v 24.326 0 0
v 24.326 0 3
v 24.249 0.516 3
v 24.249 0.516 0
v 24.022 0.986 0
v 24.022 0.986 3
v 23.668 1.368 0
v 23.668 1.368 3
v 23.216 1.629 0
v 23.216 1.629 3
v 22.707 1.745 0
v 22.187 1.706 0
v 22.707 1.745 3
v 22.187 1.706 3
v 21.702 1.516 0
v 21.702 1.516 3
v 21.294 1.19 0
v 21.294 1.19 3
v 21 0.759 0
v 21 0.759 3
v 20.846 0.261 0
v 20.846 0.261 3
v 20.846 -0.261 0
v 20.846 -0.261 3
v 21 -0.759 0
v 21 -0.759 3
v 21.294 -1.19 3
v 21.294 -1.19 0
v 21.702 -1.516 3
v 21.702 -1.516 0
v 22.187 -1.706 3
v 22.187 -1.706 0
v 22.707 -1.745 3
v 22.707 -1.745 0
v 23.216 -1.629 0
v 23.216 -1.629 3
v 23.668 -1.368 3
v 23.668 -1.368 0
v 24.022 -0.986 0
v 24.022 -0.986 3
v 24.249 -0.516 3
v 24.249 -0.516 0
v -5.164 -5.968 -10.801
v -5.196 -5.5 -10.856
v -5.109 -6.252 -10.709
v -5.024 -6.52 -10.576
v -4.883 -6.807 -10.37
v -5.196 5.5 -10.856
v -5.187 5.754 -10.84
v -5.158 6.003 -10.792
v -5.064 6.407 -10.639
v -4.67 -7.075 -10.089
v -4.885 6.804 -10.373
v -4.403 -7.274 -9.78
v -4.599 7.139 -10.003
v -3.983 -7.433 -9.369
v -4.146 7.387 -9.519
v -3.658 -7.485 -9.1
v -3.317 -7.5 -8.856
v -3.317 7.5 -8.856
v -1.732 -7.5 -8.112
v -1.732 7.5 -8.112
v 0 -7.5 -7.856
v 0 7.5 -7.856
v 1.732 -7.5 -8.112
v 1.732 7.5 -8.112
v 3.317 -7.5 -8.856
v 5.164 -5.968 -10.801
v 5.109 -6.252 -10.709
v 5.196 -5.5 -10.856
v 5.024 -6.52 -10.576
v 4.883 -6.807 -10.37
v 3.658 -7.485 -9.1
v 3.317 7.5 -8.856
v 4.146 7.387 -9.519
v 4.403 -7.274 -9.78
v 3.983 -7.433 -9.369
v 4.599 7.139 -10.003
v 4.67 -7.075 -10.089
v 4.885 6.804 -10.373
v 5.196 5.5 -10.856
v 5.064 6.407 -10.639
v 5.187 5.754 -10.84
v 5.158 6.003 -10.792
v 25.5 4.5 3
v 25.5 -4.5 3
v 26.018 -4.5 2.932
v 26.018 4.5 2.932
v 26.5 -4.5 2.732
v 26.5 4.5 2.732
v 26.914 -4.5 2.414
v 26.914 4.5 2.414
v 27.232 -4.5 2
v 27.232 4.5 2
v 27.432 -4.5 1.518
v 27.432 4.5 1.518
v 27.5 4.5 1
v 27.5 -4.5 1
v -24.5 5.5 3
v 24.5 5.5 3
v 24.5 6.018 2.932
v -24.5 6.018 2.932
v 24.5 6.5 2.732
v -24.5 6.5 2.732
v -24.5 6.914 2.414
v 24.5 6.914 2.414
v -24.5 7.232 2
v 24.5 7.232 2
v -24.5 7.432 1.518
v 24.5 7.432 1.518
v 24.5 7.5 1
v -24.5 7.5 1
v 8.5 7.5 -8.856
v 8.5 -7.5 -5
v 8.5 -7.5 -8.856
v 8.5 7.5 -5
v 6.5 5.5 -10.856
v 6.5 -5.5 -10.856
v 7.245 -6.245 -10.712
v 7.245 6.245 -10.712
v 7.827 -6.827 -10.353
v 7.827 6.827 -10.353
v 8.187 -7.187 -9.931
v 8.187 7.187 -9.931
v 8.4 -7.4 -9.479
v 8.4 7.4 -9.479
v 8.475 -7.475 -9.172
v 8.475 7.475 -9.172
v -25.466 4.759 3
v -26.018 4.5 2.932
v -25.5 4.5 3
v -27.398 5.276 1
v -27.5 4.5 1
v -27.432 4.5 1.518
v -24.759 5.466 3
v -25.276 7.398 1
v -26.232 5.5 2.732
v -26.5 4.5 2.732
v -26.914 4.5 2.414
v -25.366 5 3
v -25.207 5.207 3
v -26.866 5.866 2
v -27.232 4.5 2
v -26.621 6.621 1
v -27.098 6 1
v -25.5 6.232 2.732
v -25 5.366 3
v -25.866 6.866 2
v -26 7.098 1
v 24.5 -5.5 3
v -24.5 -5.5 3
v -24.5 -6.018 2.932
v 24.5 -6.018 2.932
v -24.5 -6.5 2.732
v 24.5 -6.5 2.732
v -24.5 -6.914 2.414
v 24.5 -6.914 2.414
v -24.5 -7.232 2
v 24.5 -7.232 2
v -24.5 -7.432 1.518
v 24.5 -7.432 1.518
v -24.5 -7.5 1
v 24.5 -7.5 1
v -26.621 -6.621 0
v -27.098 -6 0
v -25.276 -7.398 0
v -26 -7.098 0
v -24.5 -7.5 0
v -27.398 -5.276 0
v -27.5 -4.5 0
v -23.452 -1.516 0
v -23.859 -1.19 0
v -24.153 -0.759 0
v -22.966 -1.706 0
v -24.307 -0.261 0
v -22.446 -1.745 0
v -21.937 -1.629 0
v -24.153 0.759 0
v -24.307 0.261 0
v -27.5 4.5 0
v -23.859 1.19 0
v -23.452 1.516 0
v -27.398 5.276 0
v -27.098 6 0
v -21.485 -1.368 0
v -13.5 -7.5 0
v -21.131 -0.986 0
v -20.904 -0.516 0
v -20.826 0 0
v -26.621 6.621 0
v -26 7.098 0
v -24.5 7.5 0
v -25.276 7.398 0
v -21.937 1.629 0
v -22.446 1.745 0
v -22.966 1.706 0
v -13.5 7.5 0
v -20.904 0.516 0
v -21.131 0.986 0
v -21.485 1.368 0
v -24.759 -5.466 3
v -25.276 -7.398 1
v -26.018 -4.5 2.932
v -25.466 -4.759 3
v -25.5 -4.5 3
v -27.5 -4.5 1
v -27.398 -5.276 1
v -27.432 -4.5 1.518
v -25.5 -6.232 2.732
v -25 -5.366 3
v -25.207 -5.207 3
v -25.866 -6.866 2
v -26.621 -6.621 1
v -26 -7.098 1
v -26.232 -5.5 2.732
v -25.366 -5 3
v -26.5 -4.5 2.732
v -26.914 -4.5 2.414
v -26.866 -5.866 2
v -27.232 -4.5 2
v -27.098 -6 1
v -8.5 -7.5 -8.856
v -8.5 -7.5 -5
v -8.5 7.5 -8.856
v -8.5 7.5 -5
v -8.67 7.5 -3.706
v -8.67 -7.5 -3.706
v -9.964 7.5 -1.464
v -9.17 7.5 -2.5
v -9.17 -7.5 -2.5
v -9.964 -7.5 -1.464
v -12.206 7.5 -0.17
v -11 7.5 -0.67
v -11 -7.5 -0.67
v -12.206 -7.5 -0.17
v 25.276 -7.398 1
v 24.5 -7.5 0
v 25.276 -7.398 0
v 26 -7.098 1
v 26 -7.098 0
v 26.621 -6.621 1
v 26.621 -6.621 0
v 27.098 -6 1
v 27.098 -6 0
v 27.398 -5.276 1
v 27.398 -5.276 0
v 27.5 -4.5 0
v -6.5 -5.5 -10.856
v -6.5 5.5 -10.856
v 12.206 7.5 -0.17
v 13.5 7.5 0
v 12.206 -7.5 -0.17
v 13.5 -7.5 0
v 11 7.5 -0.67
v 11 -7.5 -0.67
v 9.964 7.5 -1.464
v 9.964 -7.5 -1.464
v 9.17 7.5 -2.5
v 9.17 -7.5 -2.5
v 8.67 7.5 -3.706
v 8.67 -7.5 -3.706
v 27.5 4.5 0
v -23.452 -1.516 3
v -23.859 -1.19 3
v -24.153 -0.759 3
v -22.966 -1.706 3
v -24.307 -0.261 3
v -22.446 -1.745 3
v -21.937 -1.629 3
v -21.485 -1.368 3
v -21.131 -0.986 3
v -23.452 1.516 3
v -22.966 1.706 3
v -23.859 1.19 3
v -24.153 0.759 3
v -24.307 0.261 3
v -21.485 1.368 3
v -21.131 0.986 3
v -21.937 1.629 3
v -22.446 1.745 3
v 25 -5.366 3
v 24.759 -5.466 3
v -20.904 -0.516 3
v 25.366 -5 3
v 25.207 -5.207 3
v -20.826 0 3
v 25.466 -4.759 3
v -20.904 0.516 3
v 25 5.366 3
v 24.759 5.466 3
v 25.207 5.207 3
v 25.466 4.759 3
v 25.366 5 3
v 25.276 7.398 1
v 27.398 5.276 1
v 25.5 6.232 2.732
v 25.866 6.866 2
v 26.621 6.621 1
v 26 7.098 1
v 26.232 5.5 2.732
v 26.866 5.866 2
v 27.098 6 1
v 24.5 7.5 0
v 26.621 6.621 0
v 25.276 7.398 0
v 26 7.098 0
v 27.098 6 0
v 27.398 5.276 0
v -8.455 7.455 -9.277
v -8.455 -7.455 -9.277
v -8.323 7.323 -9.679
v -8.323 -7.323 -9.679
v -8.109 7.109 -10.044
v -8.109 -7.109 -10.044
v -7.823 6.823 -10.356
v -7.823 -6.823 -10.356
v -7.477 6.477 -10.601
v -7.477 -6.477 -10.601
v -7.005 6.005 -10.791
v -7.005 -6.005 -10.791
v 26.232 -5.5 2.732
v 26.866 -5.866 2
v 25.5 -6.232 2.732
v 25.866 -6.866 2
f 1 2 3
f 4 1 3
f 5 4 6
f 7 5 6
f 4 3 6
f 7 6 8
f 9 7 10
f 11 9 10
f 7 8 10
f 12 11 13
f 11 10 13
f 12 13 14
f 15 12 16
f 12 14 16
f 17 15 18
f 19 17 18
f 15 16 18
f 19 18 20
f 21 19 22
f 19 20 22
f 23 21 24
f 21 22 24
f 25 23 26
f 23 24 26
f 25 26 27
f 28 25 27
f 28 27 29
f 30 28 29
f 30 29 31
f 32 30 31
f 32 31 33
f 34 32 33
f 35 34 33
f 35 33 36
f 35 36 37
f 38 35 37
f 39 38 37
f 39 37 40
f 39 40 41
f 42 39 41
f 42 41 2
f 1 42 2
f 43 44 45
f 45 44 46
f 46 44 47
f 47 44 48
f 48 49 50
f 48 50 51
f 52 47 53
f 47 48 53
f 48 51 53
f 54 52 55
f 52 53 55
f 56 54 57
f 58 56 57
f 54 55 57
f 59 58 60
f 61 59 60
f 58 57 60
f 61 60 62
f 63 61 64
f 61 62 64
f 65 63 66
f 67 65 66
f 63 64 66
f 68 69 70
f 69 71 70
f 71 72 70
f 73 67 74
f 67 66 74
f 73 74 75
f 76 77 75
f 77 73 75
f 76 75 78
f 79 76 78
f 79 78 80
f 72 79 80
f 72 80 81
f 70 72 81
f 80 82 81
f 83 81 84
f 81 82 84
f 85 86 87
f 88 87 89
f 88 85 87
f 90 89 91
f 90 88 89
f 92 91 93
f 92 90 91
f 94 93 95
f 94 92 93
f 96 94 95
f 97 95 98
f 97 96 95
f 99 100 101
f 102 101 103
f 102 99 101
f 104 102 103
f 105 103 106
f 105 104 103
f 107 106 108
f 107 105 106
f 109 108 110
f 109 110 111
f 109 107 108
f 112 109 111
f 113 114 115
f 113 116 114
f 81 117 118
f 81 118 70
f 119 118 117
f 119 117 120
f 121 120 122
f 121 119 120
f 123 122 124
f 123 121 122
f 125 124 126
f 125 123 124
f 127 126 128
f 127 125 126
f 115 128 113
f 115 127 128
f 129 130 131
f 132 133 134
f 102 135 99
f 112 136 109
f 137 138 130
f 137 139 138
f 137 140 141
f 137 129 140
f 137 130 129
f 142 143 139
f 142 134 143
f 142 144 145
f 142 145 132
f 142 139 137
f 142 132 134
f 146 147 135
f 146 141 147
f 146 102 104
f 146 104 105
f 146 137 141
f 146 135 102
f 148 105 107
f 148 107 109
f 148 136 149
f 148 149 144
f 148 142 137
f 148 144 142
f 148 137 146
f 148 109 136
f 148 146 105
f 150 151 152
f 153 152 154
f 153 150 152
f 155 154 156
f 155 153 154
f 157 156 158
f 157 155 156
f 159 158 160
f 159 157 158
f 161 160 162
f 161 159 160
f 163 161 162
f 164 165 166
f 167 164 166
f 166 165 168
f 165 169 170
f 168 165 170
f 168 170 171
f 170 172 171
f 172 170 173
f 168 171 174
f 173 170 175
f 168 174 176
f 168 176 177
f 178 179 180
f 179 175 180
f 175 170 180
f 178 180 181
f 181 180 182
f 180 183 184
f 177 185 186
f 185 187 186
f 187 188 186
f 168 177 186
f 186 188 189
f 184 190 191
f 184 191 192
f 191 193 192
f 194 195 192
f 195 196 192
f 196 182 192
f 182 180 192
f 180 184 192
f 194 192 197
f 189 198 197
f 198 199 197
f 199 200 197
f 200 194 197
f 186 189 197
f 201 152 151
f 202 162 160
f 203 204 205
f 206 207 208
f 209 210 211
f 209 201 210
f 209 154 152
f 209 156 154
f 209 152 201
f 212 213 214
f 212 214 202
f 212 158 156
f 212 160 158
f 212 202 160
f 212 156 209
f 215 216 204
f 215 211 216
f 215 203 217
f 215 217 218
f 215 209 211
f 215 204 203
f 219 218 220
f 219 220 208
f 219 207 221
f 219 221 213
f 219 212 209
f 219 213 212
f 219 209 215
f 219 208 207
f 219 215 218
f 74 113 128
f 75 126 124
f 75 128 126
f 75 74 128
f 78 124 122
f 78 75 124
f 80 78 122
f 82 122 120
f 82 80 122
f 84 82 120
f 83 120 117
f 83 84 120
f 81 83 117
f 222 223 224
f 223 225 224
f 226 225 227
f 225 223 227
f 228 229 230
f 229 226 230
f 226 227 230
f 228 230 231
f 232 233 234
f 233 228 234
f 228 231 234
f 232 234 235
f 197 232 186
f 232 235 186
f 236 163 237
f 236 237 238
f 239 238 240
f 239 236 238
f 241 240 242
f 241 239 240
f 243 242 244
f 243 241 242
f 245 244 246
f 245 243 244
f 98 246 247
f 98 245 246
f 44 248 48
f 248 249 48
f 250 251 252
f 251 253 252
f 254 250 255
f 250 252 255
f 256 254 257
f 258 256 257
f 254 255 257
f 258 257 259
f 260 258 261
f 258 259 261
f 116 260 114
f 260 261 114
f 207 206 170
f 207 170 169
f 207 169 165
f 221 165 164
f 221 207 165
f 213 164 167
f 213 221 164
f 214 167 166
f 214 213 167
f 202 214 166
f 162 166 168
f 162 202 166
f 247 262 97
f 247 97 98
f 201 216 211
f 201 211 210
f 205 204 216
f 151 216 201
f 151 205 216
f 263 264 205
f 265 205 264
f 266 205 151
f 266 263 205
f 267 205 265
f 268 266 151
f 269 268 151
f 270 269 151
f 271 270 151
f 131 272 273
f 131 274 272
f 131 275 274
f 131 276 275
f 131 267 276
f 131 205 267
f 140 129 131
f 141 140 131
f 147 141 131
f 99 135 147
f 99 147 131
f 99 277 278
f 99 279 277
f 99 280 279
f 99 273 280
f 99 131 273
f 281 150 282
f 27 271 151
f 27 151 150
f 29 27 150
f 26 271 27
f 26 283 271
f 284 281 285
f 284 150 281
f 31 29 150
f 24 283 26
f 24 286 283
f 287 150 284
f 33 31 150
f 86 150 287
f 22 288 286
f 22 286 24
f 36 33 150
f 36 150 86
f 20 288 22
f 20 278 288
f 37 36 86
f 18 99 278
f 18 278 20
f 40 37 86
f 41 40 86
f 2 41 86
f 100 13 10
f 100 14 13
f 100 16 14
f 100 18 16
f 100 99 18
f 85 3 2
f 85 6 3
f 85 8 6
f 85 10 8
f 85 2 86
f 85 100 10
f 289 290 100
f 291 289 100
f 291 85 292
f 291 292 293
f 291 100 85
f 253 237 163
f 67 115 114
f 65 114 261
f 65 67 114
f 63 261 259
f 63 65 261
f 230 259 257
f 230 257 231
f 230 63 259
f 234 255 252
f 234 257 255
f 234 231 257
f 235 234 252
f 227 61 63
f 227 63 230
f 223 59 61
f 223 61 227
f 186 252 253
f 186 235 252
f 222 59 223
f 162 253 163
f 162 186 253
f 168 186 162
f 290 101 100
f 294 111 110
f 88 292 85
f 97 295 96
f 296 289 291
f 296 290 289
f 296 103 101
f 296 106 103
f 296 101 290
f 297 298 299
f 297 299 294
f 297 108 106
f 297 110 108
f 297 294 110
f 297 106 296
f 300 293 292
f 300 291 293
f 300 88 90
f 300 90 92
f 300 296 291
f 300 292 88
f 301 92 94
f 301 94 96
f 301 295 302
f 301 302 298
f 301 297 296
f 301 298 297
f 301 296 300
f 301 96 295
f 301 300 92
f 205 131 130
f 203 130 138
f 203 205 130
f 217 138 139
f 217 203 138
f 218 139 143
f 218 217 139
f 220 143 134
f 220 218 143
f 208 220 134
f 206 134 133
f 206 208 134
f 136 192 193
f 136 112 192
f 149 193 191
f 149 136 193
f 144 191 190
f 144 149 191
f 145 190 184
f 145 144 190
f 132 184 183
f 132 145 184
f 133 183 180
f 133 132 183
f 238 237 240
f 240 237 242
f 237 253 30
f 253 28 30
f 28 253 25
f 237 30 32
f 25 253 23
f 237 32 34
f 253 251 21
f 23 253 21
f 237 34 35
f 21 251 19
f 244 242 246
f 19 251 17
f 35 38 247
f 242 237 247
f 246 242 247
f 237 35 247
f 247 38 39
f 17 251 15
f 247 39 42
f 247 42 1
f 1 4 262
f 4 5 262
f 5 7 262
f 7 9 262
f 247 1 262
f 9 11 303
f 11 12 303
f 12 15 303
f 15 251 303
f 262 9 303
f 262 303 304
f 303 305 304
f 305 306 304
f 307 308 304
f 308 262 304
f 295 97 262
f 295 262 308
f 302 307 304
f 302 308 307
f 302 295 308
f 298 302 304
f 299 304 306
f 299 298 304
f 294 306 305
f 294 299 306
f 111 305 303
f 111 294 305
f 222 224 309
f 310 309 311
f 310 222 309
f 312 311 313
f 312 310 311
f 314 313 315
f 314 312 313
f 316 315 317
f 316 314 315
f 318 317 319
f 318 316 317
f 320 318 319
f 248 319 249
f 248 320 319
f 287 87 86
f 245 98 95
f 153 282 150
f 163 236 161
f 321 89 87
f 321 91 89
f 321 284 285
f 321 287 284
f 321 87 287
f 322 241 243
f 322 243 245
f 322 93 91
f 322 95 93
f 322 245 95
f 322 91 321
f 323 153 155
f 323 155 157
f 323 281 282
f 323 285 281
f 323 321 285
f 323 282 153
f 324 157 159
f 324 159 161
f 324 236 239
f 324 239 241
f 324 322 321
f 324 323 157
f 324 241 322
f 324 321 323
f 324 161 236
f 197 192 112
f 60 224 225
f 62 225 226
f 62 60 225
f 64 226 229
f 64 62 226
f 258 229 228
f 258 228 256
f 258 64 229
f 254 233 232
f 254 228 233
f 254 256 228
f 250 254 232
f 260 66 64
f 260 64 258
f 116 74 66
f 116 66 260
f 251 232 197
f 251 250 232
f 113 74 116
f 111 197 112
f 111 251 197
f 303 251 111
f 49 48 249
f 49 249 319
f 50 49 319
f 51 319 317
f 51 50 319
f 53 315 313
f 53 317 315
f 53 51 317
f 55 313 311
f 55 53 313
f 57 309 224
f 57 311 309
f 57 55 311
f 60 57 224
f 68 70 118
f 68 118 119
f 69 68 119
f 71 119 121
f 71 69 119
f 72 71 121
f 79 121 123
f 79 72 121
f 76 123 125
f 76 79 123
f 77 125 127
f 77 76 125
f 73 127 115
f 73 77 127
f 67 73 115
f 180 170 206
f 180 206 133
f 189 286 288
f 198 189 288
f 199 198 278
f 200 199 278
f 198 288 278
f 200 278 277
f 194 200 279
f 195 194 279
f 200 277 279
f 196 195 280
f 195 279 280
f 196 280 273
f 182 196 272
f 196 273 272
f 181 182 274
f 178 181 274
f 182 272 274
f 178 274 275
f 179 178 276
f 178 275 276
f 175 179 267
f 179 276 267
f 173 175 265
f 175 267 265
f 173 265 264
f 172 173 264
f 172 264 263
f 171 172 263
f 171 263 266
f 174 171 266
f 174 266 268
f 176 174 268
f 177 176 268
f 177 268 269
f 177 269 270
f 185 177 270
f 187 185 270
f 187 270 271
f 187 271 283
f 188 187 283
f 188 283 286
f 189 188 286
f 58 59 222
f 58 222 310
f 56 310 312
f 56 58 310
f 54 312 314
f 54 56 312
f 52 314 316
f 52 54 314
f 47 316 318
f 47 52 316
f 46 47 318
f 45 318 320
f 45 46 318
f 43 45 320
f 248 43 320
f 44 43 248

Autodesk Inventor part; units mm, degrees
ref_plane "YZ Plane" through (0, 0, 0) normal (1, 0, 0) x (0, 1, 0)
ref_plane "XZ Plane" through (0, 0, 0) normal (0, 1, 0) x (-1, 0, 0)
ref_plane "XY Plane" through (0, 0, 0) normal (0, 0, 1) x (1, 0, 0)
sketch "Sketch1" plane through (0, 0, 0) normal (0, 0, 1) x (1, 0, 0)
  point P0 (0, 0)
sketch "Sketch2" plane through (0, 0, 0) normal (0, 0, 1) x (1, 0, 0)
  line L0 (-27.5, 7.5) -> (27.5, 7.5)
  line L1 (27.5, 7.5) -> (27.5, -7.5)
  line L2 (27.5, -7.5) -> (-27.5, -7.5)
  line L3 (-27.5, -7.5) -> (-27.5, 7.5)
  line L4 (-27.5, 7.5) -> (27.5, -7.5) construction
  line L5 (27.5, 7.5) -> (-27.5, -7.5) construction
  point P0 (0, 0)
  dimension "d0" = 15
  dimension "d1" = 55
extrude "Extrusion1" add sketch "Sketch2" along normal blind 3
sketch "Sketch3" plane through (0, 0, 3) normal (0, 0, 1) x (1, 0, 0)
  line L0 (0, 0) -> (22.5765, 0) construction
  circle A0 centre (22.5765, 0) radius 1.75
  line L1 (27.5, 7.5) -> (-27.5, 7.5) construction
  line L2 (0, 7.5) -> (0, -7.5) construction
  line L3 (-27.5, -7.5) -> (27.5, -7.5) construction
  line L4 (0, 0) -> (-22.5765, 0) construction
  circle A1 centre (-22.5765, 0) radius 1.75
  dimension "d4" = 3.5
  dimension "d5" = 45.153
extrude "Extrusion2" cut sketch "Sketch3" against normal through all
sketch "Sketch4" plane through (-27.5, 7.5, 0) normal (0, 1, 0) x (1, 0, 0)
  line L0 (55, 0) -> (0, 0) projected
  line L1 (19, 0) -> (19, 10.8562)
  line L2 (36, 0) -> (36, 10.8562)
  line L3 (27.5, 10.8562) -> (27.5, 0) construction
  line L4 (19, 7.8562) -> (36, 7.8562) construction
  line L5 (19, 0) -> (36, 0) construction
  line L6 (19, 0) -> (36, 0)
  line L7 (19, 10.8562) -> (36, 10.8562) construction
  circle A0 centre (27.5, 13.8562) radius 6
  line L8 (19, 10.8562) -> (22.3038, 10.8562)
  line L9 (36, 10.8562) -> (32.6962, 10.8562)
  dimension "d10" = 10.8562
  dimension "d11" = 17
  dimension "d12" = 12
  dimension "d13" = 3
extrude "Extrusion3" add sketch "Sketch4" against normal up to surface (15 mm away) contours L0 L1 L8 A0 L9 L2
fillet "Fillet1" radius 3 4 edges at (-27.5, 7.5, 1.5) (-27.5, -7.5, 1.5) (27.5, 7.5, 1.5) (27.5, -7.5, 1.5)
fillet "Fillet2" radius 2 8 edges at (-26.6213, 6.6213, 3) (-27.5, 0, 3) (-26.6213, -6.6213, 3) (0, -7.5, 3) (26.6213, -6.6213, 3) (27.5, 0, 3) (26.6213, 6.6213, 3) (0, 7.5, 3)
fillet "Fillet3" radius 5 2 edges at (-8.5, 0, 0) (8.5, 0, 0)
fillet "Fillet4" radius 2 6 edges at (-6.8481, 7.5, -10.8562) (-8.5, 0, -10.8562) (8.5, 0, -10.8562) (-6.8481, -7.5, -10.8562) (6.8481, -7.5, -10.8562) (6.8481, 7.5, -10.8562)
properties part number "PlotterPenHolderAltClamp"
